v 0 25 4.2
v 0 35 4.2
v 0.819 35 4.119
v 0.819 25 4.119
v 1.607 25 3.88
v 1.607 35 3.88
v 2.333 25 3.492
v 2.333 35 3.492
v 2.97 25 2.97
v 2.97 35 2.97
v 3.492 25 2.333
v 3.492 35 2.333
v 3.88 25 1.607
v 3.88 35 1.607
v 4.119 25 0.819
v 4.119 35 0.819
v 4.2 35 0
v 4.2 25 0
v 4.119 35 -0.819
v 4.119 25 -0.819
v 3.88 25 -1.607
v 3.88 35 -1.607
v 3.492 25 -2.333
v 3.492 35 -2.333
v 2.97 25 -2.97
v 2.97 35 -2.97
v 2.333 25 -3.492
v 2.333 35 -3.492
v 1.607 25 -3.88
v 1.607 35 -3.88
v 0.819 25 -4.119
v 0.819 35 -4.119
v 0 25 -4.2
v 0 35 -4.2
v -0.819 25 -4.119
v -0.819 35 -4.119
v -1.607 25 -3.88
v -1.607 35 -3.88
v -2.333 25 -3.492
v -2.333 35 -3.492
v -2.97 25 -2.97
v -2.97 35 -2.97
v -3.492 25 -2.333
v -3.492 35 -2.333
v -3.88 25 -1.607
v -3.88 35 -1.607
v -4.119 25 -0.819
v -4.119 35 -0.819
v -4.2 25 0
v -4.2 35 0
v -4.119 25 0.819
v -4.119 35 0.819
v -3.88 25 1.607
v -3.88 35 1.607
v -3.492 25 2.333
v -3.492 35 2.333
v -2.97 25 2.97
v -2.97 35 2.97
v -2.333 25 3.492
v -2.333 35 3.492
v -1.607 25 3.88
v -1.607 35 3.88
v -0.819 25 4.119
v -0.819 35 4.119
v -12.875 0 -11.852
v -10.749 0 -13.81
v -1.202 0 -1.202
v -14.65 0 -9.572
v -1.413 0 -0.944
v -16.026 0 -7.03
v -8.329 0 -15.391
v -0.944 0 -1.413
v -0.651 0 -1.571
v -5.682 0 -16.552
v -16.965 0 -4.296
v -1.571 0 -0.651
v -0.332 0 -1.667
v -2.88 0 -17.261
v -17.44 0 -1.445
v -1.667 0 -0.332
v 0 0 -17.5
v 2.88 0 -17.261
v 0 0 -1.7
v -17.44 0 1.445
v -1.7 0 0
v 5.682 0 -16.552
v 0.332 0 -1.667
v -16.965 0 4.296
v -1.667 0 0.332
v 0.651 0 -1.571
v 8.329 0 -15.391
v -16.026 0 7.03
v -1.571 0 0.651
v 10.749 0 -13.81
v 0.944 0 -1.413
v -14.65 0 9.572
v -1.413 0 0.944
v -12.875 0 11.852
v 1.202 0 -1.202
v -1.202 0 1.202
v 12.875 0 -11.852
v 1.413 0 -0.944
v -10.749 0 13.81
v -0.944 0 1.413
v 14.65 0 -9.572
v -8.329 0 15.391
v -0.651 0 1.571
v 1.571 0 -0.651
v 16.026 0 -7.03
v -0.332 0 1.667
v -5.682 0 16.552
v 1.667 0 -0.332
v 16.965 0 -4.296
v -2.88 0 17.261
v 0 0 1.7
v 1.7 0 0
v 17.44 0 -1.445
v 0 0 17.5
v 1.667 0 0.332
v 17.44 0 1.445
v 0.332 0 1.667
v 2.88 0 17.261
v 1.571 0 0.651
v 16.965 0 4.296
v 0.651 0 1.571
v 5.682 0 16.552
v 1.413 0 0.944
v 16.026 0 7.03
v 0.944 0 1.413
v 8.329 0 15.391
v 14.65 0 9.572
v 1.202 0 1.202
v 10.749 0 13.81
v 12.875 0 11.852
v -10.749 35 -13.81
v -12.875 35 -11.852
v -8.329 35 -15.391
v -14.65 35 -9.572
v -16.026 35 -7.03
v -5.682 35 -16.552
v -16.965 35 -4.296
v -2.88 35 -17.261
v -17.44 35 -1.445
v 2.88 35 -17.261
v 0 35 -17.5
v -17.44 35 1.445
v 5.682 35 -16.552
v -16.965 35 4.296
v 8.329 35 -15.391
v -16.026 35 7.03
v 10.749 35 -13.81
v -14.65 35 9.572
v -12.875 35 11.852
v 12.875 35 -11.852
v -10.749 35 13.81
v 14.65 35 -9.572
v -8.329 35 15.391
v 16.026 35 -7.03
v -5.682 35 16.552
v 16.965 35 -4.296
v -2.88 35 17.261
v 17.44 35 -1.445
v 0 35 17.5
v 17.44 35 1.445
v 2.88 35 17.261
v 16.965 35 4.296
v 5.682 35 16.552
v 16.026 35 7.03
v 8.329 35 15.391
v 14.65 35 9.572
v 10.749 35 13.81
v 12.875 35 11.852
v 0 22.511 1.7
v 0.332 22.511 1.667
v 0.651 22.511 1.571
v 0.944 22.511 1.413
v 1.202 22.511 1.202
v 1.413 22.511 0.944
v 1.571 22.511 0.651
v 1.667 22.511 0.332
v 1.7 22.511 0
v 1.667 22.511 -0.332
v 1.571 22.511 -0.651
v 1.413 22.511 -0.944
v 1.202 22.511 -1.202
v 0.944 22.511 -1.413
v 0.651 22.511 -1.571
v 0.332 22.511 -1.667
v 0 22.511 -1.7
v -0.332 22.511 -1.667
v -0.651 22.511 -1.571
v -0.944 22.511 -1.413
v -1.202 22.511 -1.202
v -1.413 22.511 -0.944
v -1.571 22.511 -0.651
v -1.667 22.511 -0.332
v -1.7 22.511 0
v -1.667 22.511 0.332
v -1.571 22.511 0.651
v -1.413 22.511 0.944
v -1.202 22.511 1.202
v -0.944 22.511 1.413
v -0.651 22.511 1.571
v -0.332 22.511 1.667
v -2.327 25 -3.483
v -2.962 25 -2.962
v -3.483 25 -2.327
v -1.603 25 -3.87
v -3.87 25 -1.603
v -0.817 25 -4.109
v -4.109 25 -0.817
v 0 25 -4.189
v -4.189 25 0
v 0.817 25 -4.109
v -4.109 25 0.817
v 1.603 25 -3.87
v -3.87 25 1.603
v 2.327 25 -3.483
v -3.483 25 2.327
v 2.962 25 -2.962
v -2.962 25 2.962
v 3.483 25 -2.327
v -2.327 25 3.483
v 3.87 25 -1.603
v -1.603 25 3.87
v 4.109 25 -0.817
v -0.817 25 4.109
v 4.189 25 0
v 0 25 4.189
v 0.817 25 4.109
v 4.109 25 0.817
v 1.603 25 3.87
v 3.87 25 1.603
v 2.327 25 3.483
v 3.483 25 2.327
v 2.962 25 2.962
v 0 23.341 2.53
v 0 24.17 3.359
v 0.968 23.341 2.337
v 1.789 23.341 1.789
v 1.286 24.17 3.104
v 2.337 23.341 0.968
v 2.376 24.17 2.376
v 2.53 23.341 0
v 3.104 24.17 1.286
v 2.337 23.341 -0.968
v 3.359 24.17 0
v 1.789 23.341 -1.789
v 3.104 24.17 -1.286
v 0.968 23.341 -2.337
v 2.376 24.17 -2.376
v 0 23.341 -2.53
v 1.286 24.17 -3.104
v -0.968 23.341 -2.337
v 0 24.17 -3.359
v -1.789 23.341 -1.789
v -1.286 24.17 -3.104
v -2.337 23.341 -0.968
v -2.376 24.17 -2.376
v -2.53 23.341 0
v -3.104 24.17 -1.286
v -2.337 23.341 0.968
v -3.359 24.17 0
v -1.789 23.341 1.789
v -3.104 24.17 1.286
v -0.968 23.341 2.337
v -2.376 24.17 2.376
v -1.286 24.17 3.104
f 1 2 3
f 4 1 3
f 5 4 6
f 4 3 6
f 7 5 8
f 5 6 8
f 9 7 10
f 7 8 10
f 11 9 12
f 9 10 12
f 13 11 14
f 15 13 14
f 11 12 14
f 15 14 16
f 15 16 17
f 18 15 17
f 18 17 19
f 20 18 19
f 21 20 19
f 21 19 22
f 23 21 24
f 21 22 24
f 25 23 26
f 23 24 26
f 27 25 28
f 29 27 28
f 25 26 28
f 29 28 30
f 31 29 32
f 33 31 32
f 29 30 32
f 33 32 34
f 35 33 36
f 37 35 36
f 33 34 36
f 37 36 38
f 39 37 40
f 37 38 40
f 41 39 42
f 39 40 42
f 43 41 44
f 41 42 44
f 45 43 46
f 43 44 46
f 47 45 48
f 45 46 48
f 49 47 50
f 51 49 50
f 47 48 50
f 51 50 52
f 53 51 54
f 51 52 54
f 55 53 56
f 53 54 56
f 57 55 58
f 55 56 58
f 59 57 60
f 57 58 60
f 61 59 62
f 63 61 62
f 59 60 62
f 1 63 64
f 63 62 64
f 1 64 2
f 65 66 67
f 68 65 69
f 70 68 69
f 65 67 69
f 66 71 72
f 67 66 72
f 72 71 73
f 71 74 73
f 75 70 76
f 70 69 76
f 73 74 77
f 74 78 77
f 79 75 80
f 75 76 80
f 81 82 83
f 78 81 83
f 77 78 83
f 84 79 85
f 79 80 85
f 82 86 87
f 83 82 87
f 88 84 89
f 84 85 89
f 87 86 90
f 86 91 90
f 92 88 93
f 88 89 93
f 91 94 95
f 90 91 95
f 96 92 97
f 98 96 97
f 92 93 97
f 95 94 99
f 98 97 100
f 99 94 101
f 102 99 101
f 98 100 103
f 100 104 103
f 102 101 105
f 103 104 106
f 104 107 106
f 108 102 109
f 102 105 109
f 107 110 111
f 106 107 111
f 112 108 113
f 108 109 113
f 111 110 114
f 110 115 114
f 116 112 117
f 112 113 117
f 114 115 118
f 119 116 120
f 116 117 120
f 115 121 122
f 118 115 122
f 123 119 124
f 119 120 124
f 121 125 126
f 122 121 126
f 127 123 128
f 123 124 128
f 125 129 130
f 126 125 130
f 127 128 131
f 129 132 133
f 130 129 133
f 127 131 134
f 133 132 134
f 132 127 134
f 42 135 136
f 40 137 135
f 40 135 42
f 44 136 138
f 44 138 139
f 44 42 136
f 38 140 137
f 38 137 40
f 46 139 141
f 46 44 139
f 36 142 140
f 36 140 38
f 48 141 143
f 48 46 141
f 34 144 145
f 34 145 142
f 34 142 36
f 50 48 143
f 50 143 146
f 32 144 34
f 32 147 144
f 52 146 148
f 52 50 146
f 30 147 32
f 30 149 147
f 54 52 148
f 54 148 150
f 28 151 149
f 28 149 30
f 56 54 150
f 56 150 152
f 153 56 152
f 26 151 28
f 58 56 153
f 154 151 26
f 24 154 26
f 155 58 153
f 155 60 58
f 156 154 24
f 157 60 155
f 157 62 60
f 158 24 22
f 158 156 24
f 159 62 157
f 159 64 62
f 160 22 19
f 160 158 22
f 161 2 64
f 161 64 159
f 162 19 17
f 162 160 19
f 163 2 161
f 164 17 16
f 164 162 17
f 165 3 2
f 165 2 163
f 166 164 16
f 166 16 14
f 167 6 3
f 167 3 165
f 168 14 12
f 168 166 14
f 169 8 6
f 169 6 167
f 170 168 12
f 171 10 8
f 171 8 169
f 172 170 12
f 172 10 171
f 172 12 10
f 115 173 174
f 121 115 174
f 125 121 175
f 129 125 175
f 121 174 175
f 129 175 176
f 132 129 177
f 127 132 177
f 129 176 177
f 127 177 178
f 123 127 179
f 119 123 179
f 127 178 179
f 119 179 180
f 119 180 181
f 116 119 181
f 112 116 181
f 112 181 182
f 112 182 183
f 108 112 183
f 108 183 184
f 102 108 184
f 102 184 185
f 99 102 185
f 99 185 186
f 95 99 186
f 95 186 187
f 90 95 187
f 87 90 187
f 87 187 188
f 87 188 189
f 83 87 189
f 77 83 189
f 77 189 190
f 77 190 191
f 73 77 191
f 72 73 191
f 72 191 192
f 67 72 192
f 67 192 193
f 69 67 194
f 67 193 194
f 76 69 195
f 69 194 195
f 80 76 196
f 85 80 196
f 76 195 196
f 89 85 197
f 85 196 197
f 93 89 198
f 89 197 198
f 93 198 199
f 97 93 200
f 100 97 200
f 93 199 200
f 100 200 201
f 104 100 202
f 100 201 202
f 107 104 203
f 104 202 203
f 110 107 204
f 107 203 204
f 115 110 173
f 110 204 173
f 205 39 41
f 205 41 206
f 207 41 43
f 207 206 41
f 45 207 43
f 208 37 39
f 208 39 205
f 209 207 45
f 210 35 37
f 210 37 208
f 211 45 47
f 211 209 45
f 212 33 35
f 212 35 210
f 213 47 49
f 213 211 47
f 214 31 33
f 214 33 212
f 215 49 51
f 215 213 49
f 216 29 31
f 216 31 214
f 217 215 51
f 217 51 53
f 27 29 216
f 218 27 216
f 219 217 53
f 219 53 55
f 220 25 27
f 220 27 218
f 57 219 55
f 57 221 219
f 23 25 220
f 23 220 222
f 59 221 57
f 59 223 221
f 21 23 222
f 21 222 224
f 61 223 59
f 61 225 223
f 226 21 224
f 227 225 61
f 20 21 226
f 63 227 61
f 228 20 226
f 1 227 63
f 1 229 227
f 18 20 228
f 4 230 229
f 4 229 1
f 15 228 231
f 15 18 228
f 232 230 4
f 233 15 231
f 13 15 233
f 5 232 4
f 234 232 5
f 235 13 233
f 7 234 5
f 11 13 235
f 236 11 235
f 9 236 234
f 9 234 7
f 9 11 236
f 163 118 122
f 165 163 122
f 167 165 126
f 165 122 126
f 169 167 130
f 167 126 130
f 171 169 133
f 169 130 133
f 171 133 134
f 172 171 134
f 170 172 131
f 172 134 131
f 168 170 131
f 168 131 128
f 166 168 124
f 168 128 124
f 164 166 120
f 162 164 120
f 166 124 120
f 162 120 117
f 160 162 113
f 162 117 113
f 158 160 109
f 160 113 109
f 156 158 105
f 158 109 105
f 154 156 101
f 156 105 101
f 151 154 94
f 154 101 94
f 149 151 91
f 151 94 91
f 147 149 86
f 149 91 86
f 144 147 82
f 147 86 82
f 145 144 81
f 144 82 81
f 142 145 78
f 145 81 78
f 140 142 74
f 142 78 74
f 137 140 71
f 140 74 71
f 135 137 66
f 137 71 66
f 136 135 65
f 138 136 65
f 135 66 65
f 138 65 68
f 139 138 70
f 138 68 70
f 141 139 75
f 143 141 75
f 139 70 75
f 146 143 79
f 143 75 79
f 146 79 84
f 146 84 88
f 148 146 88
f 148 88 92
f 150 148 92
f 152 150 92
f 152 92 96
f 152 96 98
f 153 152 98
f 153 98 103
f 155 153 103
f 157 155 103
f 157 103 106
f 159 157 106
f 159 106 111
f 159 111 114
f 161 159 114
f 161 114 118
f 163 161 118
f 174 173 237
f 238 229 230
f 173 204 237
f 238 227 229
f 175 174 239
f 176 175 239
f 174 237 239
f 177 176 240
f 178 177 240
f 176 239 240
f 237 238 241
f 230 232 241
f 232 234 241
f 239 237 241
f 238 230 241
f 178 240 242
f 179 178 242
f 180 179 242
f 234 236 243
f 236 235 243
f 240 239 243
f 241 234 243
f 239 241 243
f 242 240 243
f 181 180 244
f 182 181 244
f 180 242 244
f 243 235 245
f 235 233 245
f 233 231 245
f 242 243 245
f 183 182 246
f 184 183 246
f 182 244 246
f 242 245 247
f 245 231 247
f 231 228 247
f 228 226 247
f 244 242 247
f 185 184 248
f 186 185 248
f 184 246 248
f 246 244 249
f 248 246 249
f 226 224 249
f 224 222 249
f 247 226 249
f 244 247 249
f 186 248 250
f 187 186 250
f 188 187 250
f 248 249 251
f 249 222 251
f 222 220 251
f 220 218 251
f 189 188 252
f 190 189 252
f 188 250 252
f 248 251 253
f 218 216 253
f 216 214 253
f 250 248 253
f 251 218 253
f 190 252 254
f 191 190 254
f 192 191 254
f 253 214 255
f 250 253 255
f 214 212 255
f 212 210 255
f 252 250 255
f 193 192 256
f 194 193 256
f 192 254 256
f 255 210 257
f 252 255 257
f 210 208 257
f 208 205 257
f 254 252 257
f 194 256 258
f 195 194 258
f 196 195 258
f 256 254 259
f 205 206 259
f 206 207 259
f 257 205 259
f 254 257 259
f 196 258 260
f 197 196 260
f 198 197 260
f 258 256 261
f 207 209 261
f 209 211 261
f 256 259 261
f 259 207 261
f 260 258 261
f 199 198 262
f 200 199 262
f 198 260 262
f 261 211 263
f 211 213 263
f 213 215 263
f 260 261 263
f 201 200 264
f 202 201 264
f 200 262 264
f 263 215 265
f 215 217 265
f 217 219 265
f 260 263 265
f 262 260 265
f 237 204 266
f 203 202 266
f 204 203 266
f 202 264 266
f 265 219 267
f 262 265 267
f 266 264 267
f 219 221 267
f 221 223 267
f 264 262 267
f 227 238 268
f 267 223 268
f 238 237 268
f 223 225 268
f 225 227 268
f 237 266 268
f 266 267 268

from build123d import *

# Parameters (mm, degrees)
SKETCH1_R           = 17.5
BOSS_EXTRUDE1_DEPTH = 35
SKETCH2_R           = 4.2
CUT_EXTRUDE1_DEPTH  = 10
SKETCH3_R           = 1.7
CUT_EXTRUDE2_DEPTH  = 26
CHAMFER1_SIZE       = 2.4892


with BuildPart() as part:
    # Sketch1 → Boss-Extrude1 (new body)
    with BuildSketch(Plane(origin=(0, 0, 0), x_dir=(1, 0, 0), z_dir=(0, 1, 0))):
        with Locations(Location((0, 0, 0), (0, 0, 270))):  # turned: the seam where the file's is
            Circle(SKETCH1_R)
    extrude(amount=BOSS_EXTRUDE1_DEPTH)

    # Sketch2 → Cut-Extrude1 (cut)
    with BuildSketch(Plane(origin=(0, 35, 0), x_dir=(1, 0, 0), z_dir=(0, 1, 0))):
        with Locations(Location((0, 0, 0), (0, 0, 270))):  # turned: the seam where the file's is
            Circle(SKETCH2_R)
    extrude(amount=-CUT_EXTRUDE1_DEPTH, mode=Mode.SUBTRACT)

    # Sketch3 → Cut-Extrude2 (cut, through all)
    with BuildSketch(Plane(origin=(0, 25, 0), x_dir=(1, 0, 0), z_dir=(0, 1, 0))):
        with Locations(Location((0, 0, 0), (0, 0, 270))):  # turned: the seam where the file's is
            Circle(SKETCH3_R)
    extrude(amount=-CUT_EXTRUDE2_DEPTH, mode=Mode.SUBTRACT)

    # Chamfer1
    chamfer1_edges = [part.edges().sort_by_distance(p)[0] for p in [
        (0, 25, -1.7),
    ]]
    chamfer(chamfer1_edges, length=CHAMFER1_SIZE)


solid = part.part
